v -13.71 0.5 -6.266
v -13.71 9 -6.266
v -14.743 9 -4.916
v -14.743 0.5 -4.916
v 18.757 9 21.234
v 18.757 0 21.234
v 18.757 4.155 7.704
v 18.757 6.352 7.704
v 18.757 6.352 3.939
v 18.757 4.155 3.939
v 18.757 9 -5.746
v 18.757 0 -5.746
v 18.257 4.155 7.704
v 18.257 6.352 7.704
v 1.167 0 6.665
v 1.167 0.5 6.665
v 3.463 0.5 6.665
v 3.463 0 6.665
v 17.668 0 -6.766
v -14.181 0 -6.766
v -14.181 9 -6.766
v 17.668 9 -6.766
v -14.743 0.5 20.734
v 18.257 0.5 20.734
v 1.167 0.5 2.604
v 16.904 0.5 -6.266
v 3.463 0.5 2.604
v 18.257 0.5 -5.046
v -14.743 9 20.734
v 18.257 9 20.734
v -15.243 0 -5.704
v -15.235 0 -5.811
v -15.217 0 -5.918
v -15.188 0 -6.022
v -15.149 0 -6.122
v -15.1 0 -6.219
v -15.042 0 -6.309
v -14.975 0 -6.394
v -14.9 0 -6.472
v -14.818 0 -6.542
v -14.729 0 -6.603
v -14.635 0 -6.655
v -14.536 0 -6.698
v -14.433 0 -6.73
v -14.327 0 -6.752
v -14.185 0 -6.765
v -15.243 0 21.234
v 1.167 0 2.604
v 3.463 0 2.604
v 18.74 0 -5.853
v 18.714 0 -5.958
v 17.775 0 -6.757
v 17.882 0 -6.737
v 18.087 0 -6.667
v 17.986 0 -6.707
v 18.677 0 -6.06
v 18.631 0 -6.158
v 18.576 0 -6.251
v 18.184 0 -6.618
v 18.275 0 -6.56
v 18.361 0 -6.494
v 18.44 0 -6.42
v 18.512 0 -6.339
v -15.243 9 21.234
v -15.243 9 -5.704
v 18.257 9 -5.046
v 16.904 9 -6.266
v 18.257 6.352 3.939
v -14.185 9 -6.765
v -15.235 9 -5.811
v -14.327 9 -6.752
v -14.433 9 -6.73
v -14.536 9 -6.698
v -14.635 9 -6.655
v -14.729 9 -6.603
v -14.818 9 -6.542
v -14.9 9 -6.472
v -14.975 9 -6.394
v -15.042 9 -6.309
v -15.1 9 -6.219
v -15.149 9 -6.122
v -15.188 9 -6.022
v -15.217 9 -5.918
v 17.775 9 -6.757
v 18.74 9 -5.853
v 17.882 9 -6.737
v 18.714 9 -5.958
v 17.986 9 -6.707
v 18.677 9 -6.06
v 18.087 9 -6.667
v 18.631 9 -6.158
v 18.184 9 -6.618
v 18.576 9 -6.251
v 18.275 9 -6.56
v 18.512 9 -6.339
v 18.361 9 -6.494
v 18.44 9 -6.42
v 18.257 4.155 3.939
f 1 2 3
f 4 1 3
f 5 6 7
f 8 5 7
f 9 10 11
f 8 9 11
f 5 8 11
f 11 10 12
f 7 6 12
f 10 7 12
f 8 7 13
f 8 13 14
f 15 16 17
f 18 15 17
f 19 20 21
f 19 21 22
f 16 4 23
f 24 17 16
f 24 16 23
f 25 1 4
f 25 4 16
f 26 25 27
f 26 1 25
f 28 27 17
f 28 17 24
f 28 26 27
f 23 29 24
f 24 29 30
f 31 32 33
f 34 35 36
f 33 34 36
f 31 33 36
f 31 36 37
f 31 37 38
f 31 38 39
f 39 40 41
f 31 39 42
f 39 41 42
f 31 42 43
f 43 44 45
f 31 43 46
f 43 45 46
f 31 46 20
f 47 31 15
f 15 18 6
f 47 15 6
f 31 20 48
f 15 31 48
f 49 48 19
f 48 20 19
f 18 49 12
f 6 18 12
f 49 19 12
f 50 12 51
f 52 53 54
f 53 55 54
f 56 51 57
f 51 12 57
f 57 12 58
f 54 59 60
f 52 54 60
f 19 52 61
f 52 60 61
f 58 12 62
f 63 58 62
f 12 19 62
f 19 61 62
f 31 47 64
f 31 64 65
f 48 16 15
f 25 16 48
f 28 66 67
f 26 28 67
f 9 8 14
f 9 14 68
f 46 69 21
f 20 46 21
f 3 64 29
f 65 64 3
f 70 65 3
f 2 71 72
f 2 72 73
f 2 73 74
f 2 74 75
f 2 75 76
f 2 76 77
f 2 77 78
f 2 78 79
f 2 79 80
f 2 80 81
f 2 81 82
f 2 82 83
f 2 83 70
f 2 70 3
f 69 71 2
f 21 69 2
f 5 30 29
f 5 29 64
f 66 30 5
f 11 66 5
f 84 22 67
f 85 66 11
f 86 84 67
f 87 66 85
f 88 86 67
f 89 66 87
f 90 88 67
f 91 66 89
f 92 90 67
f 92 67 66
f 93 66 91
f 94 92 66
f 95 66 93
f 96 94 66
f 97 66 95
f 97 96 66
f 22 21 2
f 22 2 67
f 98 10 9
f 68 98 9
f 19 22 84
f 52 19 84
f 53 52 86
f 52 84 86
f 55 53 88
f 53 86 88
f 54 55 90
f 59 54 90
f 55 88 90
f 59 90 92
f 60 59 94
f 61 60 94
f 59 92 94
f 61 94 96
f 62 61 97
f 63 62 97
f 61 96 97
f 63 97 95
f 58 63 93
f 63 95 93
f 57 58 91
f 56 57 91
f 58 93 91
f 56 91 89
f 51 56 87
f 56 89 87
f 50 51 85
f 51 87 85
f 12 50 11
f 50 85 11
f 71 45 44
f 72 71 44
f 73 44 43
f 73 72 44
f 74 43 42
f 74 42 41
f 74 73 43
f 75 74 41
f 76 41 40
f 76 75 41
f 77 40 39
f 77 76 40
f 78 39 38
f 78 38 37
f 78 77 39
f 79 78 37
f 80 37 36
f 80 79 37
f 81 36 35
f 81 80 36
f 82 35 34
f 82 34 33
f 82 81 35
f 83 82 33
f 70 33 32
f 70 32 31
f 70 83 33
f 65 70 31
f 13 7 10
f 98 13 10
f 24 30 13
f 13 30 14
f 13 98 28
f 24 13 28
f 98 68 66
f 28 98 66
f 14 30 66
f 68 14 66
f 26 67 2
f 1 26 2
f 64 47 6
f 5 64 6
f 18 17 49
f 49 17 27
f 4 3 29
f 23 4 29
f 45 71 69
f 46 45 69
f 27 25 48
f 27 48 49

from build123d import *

# Parameters (mm, degrees)
SKETCH1_W           = 34
SKETCH1_H           = 28
BOSS_EXTRUDE1_DEPTH = 9
CUT_EXTRUDE1_DEPTH  = 8.5
CUT_EXTRUDE2_DEPTH  = 9
CUT_EXTRUDE3_DEPTH  = 9
SKETCH6_W           = 2.295965215
SKETCH6_H           = 4.061171394
CUT_EXTRUDE4_DEPTH  = 9
SKETCH7_W           = 3.765813474
SKETCH7_H           = 2.196724527
CUT_EXTRUDE5_DEPTH  = 9


with BuildPart() as part:
    # Sketch1 → Boss-Extrude1 (new body)
    with BuildSketch(Plane(origin=(0, 0, 0), x_dir=(1, 0, 0), z_dir=(0, 1, 0))):
        with Locations((1.757158316, -7.233665399)):
            Rectangle(SKETCH1_W, SKETCH1_H)
    extrude(amount=BOSS_EXTRUDE1_DEPTH)

    # Sketch3 → Cut-Extrude1 (cut)
    with BuildSketch(Plane(origin=(0, 9, 0), x_dir=(1, 0, 0), z_dir=(0, 1, 0))):
        Polygon((-13.709642768, 6.266334601), (-14.742841684, 4.916334601), (-14.742841684, -17.206480141), (-14.742841684, -20.733665399), (18.257158316, -20.733665399), (18.257158316, 5.046334601), (16.903908894, 6.266334601), align=None)
    extrude(amount=-CUT_EXTRUDE1_DEPTH, mode=Mode.SUBTRACT)

    # Sketch4 → Cut-Extrude2 (cut)
    with BuildSketch(Plane(origin=(0, 9, 0), x_dir=(1, 0, 0), z_dir=(0, 1, 0))):
        with BuildLine():
            Line((-15.242841684, 5.703653574), (-15.242841684, 6.766334601))
            Line((-15.242841684, 6.766334601), (-14.184858911, 6.765079364))
            ThreePointArc((-14.184858911, 6.765079364), (-14.926543667, 6.446369911), (-15.242841684, 5.703653574))
        make_face()
        with BuildLine():
            Line((18.763393814, 5.6549421), (18.757158316, 6.766334601))
            Line((18.757158316, 6.766334601), (17.66754215, 6.766334601))
            ThreePointArc((17.66754215, 6.766334601), (18.434091592, 6.4262049), (18.763393814, 5.6549421))
        make_face()
    extrude(amount=-CUT_EXTRUDE2_DEPTH, mode=Mode.SUBTRACT)

    # Sketch5 → Cut-Extrude3 (cut)
    with BuildSketch(Plane(origin=(0, 9, 0), x_dir=(1, 0, 0), z_dir=(0, 1, 0))):
        Polygon((-14.184858911, 6.765079364), (-14.181243432, 6.766334601), (-15.374291847, 6.820902747), (-15.330265958, 6.661105077), align=None)
    extrude(amount=-CUT_EXTRUDE3_DEPTH, mode=Mode.SUBTRACT)

    # Sketch6 → Cut-Extrude4 (cut)
    with BuildSketch(Plane(origin=(0, 0.5, 0), x_dir=(1, 0, 0), z_dir=(0, 1, 0))):
        with Locations((2.314867695, -4.634515707)):
            Rectangle(SKETCH6_W, SKETCH6_H)
    extrude(amount=-CUT_EXTRUDE4_DEPTH, mode=Mode.SUBTRACT)

    # Sketch7 → Cut-Extrude5 (cut)
    with BuildSketch(Plane(origin=(18.757158316, 0, 0), x_dir=(0, 0, -1), z_dir=(1, 0, 0))):
        with Locations((-5.821485346, 5.253162695)):
            Rectangle(SKETCH7_W, SKETCH7_H)
    extrude(amount=-CUT_EXTRUDE5_DEPTH, mode=Mode.SUBTRACT)


solid = part.part
